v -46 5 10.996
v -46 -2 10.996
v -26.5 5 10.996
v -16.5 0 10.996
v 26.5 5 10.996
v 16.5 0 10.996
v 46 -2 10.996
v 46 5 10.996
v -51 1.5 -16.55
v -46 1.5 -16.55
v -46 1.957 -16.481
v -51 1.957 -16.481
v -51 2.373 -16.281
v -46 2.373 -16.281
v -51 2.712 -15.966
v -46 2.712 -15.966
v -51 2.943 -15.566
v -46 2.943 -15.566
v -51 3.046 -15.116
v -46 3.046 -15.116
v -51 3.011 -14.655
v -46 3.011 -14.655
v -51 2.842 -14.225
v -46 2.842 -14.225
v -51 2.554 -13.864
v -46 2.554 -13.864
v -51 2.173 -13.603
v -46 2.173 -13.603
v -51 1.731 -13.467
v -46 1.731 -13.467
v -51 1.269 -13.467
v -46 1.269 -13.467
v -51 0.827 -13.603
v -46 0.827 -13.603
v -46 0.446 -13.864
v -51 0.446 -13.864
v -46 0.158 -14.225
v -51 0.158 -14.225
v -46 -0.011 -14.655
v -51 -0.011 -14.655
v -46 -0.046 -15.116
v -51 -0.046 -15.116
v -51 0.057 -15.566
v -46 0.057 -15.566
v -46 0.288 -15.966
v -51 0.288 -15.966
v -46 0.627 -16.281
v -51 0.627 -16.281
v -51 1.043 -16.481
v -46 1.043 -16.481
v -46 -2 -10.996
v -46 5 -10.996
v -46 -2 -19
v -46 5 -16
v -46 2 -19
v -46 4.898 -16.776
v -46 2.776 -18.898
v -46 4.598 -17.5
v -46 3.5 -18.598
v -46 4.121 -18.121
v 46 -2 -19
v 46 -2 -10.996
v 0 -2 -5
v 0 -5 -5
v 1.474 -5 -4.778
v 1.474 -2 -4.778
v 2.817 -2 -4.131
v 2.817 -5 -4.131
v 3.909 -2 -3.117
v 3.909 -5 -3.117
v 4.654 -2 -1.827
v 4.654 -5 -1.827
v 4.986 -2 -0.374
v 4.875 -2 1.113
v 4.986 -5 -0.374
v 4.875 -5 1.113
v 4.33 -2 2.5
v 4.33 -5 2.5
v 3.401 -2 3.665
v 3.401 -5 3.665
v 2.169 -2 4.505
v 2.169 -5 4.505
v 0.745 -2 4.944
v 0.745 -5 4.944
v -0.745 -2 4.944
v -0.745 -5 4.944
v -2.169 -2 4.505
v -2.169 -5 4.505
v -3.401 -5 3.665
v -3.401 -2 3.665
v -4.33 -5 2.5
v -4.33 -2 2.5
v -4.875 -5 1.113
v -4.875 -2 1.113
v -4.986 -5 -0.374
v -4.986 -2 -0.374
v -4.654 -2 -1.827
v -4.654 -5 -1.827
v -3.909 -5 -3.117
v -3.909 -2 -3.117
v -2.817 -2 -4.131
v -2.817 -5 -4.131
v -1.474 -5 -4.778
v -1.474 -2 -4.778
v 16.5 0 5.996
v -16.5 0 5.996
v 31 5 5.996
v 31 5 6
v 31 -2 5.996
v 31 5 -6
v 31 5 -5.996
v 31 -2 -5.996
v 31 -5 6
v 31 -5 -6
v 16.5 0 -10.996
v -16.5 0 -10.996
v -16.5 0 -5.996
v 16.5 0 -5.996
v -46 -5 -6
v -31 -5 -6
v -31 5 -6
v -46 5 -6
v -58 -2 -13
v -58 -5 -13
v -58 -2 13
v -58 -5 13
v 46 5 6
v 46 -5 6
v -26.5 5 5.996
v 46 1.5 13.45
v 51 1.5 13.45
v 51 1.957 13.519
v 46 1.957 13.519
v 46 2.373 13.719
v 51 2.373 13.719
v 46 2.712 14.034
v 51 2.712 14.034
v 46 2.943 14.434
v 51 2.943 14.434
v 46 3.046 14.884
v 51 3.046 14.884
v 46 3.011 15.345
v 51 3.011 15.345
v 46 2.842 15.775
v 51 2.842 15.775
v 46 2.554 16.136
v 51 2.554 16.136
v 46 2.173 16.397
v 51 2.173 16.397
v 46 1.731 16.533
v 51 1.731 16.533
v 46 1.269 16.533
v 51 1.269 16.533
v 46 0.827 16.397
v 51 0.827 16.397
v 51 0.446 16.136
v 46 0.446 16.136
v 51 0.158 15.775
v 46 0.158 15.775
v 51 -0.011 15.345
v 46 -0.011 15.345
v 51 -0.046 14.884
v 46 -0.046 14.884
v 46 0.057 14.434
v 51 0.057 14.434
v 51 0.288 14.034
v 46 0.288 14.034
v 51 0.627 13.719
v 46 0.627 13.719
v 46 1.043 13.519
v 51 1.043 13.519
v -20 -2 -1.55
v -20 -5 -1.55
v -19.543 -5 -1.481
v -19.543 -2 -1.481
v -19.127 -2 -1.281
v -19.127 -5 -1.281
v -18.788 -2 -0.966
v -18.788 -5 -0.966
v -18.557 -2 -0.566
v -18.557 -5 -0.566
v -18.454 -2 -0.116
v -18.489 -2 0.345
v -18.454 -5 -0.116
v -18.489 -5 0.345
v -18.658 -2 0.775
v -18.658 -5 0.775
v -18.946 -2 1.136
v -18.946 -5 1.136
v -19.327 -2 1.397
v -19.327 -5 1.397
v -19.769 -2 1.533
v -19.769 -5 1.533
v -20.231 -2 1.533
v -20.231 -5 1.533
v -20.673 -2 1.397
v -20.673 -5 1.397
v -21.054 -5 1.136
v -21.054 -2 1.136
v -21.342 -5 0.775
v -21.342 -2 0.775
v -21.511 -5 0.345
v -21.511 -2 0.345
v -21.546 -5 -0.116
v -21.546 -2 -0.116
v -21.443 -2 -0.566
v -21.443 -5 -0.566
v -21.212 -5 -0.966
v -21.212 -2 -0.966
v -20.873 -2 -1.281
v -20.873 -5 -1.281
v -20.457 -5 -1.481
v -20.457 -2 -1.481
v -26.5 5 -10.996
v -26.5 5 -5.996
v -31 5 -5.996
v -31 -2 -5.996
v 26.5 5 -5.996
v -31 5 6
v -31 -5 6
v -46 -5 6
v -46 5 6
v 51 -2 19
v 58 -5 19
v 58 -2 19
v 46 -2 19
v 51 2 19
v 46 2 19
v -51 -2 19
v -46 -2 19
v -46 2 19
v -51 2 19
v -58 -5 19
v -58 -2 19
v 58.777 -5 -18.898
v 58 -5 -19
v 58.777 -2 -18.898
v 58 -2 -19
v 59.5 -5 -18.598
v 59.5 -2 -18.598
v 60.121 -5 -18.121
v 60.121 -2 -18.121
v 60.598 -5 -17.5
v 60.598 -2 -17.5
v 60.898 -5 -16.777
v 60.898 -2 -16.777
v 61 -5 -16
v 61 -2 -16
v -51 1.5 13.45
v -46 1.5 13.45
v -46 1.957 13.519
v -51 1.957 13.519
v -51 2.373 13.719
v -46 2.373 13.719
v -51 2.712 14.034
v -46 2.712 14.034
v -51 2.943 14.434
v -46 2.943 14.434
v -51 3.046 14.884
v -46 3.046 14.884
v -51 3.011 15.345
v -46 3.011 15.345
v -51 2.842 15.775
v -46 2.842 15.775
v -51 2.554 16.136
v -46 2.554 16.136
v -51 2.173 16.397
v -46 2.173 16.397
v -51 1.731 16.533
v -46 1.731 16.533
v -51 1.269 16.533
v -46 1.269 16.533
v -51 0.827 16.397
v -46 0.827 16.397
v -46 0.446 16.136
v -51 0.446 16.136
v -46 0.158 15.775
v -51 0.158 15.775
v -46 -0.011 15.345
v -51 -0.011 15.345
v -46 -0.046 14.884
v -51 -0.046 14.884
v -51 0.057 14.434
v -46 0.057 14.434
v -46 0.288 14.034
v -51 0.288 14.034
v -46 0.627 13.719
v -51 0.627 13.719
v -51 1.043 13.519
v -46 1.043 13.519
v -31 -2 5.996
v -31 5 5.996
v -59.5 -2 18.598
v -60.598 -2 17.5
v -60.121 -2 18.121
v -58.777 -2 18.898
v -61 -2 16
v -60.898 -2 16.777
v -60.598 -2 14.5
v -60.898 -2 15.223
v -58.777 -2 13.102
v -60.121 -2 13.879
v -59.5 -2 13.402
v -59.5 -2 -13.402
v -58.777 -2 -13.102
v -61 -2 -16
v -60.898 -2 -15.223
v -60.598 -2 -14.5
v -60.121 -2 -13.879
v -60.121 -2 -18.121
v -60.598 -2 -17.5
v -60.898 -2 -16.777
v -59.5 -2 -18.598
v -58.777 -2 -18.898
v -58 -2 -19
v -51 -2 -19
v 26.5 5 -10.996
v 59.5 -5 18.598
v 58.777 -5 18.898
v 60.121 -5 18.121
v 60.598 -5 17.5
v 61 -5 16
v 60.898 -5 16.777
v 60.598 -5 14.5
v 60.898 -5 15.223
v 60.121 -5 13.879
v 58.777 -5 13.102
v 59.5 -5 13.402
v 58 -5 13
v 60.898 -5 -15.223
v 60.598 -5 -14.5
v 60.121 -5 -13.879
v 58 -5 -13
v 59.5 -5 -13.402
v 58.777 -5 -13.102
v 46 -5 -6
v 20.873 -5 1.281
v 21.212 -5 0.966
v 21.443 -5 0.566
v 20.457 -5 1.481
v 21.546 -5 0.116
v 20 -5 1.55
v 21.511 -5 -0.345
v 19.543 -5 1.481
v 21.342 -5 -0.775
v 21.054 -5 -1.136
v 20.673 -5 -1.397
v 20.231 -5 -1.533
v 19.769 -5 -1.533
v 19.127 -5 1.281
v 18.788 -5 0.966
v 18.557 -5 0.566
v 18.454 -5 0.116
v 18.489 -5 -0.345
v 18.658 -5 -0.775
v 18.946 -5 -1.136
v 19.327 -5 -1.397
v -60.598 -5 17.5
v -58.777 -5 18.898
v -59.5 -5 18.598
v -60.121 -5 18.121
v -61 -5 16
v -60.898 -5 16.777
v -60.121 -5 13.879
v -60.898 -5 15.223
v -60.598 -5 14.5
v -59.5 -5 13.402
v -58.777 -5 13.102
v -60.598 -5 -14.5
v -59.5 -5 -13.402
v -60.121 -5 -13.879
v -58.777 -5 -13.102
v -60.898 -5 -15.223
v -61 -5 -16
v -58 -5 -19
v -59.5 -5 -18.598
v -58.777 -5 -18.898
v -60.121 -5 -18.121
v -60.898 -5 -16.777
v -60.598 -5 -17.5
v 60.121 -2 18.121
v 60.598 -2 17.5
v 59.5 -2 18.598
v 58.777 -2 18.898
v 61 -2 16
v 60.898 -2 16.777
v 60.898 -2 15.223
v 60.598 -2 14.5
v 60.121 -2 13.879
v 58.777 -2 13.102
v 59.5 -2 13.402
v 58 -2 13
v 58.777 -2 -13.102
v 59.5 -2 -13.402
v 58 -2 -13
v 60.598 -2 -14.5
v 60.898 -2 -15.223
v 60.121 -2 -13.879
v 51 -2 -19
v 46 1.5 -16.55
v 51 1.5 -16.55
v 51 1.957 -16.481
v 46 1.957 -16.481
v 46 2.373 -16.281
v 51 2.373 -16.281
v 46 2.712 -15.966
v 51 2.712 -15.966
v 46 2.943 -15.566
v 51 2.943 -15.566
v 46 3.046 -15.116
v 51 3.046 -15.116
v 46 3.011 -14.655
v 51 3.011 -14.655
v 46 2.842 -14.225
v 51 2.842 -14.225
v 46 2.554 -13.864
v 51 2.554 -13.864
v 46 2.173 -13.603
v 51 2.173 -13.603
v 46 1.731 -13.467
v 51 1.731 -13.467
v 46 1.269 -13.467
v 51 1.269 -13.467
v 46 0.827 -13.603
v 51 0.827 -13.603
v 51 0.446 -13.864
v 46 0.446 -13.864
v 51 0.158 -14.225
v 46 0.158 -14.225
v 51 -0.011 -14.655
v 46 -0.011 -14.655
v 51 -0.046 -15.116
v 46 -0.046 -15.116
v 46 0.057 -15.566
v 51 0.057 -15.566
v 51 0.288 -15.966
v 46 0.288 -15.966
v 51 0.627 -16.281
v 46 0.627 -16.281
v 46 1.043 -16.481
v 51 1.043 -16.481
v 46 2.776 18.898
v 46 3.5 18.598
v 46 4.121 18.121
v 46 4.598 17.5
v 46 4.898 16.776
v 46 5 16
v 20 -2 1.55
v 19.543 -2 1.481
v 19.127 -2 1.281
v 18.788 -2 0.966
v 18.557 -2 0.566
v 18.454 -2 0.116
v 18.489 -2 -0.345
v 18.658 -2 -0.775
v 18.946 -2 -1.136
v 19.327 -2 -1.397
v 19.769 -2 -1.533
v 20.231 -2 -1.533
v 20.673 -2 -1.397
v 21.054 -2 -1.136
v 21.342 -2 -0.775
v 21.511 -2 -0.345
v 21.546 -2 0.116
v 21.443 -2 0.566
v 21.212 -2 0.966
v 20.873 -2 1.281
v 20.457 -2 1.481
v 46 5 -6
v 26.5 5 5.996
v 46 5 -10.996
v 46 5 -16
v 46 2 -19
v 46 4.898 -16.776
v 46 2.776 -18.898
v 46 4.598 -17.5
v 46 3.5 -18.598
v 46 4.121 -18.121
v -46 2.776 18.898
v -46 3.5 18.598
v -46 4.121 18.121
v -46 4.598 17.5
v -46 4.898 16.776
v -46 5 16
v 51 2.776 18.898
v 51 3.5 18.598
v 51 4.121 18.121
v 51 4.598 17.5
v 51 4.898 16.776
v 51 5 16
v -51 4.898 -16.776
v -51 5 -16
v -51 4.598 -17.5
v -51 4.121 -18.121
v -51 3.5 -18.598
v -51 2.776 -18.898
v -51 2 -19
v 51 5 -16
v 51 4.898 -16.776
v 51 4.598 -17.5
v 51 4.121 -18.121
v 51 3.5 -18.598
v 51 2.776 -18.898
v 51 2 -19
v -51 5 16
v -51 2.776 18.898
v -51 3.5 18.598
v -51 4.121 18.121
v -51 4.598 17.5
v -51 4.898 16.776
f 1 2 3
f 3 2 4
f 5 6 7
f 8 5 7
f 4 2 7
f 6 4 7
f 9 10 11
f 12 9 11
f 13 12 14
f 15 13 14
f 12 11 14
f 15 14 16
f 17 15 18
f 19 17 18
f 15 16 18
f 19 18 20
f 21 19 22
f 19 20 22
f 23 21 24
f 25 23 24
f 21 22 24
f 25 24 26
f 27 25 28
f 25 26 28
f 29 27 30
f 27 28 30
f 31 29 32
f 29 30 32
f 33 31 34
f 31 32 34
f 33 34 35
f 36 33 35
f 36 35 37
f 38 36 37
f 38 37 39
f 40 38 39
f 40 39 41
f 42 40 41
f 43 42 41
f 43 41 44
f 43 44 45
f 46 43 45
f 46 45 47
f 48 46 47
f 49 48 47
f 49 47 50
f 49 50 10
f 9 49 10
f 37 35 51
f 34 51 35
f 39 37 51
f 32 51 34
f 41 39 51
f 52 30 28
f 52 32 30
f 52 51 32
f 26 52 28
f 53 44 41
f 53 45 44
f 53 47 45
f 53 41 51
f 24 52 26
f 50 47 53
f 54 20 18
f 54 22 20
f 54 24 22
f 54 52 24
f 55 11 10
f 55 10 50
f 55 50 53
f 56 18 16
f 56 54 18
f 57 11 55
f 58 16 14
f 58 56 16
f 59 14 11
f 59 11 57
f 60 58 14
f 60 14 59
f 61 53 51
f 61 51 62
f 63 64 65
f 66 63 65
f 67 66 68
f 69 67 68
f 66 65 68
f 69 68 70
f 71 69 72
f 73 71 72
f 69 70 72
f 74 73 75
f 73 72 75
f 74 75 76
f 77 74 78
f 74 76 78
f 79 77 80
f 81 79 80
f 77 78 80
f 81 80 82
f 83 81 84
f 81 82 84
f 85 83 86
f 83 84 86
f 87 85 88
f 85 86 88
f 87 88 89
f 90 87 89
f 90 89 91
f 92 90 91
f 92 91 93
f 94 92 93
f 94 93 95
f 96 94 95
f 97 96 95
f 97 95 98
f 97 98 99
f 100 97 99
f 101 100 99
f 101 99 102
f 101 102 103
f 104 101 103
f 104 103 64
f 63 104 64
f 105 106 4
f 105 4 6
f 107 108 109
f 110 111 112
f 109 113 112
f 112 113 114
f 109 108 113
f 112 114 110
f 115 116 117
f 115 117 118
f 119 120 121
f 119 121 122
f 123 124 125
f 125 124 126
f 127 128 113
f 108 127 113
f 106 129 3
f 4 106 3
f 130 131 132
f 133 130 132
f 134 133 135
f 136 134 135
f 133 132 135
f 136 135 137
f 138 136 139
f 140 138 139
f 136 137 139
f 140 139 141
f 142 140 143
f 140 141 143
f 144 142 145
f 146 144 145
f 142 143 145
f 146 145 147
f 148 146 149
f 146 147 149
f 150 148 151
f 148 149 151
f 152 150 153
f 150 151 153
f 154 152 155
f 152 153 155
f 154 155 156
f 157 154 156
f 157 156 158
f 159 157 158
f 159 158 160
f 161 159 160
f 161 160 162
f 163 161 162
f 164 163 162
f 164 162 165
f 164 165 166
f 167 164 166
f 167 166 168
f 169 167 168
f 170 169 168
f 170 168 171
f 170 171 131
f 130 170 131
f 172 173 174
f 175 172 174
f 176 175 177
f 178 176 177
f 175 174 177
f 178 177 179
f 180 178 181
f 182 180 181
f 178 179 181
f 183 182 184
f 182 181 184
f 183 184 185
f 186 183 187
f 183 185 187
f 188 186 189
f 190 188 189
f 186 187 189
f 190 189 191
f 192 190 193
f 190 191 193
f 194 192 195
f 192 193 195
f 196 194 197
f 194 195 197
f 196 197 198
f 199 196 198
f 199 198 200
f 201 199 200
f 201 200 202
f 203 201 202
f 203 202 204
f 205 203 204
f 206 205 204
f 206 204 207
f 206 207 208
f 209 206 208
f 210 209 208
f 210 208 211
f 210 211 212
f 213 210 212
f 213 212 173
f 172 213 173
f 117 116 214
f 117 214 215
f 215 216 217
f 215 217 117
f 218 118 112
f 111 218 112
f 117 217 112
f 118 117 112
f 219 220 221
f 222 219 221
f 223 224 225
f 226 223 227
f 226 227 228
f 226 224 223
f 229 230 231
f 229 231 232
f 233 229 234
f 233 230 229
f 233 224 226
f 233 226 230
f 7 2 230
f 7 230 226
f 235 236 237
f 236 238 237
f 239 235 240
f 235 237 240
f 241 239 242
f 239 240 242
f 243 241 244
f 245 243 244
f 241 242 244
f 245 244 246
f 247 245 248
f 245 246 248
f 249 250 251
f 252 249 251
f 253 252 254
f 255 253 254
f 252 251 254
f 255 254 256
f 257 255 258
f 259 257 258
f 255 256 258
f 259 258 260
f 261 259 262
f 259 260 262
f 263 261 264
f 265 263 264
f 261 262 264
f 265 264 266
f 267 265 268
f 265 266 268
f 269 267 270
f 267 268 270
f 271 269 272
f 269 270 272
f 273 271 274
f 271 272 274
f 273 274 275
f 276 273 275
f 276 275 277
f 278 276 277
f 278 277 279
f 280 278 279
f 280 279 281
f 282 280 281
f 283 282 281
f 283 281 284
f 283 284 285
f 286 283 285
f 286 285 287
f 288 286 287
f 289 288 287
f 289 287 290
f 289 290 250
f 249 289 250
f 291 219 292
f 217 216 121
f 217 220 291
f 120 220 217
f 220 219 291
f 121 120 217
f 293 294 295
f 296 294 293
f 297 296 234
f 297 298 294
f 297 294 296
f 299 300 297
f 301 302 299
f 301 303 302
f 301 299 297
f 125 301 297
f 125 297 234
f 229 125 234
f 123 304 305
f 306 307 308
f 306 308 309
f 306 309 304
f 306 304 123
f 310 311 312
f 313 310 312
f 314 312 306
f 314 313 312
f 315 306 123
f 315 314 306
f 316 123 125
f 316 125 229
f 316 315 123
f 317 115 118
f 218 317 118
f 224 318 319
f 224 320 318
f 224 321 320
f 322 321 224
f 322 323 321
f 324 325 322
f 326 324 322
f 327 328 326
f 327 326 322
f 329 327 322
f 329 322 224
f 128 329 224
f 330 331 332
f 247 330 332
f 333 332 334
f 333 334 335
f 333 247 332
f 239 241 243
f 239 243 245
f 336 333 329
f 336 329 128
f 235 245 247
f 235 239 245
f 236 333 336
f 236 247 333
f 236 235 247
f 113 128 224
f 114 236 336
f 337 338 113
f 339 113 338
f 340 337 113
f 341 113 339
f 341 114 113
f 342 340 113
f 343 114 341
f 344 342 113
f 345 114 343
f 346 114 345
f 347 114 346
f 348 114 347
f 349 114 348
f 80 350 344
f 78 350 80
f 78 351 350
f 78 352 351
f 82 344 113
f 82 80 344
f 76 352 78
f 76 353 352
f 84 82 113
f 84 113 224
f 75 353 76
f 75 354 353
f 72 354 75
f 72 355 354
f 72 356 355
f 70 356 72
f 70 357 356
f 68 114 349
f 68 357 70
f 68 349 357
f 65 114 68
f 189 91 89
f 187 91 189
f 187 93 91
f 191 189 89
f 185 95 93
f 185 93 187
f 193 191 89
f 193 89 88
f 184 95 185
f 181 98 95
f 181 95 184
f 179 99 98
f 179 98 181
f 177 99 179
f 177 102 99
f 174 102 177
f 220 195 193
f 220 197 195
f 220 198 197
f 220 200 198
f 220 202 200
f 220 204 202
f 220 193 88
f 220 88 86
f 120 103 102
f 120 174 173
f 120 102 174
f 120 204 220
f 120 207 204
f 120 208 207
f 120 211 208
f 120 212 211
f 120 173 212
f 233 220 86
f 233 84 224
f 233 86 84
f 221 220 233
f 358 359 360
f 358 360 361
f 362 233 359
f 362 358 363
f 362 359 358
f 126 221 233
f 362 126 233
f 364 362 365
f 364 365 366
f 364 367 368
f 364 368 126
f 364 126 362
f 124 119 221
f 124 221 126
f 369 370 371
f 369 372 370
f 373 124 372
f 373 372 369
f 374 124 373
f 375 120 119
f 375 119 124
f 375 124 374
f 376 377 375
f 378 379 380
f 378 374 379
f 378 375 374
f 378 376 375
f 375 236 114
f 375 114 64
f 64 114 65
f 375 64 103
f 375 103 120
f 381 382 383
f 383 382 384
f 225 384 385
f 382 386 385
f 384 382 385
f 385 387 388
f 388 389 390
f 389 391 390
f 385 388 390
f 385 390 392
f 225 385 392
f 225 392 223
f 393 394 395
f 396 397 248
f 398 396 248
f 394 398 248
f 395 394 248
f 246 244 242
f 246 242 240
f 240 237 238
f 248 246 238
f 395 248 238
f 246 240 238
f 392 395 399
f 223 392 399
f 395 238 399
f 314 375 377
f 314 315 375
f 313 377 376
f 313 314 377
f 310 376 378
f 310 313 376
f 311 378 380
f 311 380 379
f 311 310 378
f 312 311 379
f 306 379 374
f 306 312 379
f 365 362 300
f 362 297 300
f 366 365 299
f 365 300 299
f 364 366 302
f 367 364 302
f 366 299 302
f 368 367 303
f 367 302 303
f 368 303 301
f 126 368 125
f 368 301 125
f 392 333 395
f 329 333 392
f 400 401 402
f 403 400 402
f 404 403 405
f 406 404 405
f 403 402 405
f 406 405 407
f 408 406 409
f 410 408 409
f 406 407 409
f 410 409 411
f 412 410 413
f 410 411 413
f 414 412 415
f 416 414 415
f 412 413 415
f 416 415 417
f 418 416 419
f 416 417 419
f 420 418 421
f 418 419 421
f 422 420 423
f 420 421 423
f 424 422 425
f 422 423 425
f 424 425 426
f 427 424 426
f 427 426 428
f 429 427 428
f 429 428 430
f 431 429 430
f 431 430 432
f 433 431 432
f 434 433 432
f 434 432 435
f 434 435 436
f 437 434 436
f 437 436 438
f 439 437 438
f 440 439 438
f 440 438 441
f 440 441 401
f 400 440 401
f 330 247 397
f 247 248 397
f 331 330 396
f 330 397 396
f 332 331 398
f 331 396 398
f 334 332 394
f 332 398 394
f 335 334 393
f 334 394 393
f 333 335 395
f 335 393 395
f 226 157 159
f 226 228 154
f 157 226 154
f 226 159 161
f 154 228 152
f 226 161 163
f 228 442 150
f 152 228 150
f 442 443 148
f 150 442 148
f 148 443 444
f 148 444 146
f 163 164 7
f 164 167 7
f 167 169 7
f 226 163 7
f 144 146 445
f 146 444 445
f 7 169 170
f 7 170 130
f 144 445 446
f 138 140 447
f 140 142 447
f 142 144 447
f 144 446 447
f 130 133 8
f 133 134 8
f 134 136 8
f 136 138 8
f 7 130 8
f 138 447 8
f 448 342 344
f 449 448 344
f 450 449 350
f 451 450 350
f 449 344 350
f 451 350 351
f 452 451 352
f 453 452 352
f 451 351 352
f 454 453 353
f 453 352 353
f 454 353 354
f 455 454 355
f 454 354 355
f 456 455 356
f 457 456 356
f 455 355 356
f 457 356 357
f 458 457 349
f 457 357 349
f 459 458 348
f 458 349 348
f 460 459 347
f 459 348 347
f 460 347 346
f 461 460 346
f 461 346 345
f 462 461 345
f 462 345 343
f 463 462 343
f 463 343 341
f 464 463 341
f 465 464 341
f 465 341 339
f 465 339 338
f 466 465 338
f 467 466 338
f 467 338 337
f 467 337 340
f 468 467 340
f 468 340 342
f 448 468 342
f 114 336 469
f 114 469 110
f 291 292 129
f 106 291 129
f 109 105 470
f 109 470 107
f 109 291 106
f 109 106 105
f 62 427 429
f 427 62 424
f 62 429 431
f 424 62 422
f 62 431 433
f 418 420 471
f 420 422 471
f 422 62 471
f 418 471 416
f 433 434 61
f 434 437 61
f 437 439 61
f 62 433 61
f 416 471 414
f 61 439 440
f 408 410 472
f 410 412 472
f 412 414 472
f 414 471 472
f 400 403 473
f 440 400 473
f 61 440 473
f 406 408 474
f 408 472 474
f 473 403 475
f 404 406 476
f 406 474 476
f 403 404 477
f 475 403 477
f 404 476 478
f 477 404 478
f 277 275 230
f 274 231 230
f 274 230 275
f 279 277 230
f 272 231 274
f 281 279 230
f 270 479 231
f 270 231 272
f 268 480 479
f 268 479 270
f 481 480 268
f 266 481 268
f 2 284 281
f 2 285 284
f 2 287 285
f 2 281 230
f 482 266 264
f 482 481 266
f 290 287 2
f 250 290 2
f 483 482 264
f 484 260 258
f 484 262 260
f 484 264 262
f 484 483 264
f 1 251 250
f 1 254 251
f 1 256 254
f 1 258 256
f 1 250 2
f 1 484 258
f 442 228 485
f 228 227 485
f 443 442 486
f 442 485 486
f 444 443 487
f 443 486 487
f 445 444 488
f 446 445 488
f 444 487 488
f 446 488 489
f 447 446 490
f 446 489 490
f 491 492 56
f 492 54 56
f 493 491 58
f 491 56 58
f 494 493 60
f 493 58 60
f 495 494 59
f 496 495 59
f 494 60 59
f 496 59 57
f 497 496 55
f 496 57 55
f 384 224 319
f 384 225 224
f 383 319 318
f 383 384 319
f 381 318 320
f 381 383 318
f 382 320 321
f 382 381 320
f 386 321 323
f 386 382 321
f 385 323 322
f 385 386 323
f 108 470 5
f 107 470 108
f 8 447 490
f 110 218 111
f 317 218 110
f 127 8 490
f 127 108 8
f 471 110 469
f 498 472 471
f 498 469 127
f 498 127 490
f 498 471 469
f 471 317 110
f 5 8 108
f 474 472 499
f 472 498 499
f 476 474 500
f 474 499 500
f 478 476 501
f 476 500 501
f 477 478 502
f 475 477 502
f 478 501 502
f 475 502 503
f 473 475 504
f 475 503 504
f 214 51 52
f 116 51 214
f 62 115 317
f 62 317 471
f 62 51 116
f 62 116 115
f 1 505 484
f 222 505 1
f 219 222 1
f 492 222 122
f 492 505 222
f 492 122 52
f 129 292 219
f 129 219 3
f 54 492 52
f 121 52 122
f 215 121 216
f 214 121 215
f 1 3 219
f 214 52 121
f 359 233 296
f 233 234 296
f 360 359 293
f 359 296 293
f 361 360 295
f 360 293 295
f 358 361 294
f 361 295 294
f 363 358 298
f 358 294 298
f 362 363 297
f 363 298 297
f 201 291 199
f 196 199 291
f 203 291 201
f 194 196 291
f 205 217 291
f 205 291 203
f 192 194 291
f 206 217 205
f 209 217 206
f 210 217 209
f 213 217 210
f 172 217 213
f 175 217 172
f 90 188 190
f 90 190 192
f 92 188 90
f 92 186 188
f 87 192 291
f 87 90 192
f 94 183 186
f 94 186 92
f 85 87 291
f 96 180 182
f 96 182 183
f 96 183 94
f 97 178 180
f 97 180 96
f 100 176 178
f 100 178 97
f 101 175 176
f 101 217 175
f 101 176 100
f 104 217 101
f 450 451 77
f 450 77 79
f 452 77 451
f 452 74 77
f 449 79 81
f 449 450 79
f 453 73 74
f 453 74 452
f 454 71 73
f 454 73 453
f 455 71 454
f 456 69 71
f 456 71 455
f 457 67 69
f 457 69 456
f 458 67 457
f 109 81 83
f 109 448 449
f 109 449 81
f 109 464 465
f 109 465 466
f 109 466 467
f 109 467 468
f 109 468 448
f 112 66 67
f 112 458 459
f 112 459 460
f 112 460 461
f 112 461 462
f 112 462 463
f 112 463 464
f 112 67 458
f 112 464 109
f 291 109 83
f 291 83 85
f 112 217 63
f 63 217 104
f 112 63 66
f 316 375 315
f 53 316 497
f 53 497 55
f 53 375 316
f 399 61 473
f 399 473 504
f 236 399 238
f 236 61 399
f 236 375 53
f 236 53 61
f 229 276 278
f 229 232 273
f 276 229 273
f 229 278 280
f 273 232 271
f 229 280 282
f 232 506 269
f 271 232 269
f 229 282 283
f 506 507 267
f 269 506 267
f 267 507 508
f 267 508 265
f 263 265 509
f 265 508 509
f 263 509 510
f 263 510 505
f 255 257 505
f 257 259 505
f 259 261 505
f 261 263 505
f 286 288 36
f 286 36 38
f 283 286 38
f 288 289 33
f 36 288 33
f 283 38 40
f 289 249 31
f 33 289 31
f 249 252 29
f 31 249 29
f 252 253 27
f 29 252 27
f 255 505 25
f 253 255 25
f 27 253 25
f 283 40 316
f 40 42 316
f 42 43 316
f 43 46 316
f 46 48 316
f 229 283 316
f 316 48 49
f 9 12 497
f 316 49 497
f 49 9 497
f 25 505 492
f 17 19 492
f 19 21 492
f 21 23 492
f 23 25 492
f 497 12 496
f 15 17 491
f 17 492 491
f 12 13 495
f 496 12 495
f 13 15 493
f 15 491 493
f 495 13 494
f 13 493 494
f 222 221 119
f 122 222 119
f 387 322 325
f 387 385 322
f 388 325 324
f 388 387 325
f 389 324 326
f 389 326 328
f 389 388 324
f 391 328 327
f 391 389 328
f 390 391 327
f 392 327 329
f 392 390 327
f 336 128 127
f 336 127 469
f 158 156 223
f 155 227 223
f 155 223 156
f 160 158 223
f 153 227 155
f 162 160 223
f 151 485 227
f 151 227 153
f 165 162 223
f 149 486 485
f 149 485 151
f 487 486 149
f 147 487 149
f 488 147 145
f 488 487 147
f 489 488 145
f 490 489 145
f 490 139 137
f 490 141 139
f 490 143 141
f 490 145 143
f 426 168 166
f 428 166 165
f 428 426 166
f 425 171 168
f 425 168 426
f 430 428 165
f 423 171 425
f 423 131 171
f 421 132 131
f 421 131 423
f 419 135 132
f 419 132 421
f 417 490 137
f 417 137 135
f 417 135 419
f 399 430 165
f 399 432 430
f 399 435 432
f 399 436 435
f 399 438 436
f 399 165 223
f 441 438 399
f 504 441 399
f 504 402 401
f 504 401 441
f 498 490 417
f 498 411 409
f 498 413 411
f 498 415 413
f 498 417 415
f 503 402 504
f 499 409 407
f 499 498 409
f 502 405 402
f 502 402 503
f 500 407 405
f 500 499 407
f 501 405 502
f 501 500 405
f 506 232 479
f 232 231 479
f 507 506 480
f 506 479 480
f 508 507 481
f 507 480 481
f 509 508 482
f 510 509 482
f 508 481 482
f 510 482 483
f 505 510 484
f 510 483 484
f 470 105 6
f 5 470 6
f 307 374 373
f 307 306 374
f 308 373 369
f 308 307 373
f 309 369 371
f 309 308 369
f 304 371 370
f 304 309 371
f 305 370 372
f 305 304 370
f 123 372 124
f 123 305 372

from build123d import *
from OCP.BRepFilletAPI import BRepFilletAPI_MakeChamfer

# Parameters (mm, degrees)
SKETCH_1_W               = 102
SKETCH_1_H               = 38
EXTRUDE_1_DEPTH          = 5
EXTRUDE_START            = -10
EXTRUDE_2_DEPTH          = 3
SKETCH_23_W              = 92
SKETCH_23_H              = 38
CUT_EXTRUDE_4_DEPTH      = 7
SKETCH_25_W              = 92.5
SKETCH_25_H              = 5
EXTRUDE_3_DEPTH          = 7
SKETCH_21_R              = 1.55
SKETCH_21_R_2            = 5
SKETCH_21_W              = 15
SKETCH_21_H              = 12
CUT_EXTRUDE_1_DEPTH      = 10
CUT_EXTRUDE_7_DEPTH      = 65.08587988
CUT_EXTRUDE_7_DEPTH_BACK = 65.08587988
SKETCH_27_W              = 53
SKETCH_27_H              = 12
CHAMFER_1_SIZE           = 5
CHAMFER_1_SIZE_2         = 10
CHAMFER_2_SIZE           = 5
CHAMFER_2_SIZE_2         = 10
SKETCH2_R                = 1.55
CUT_EXTRUDE1_DEPTH       = 114.710157858
FILLET1_R                = 3
FILLET2_R                = 3


with BuildPart() as part:
    # 草图1 → 凸台-拉伸1 (new, symmetric)
    with BuildSketch(Plane(origin=(0, 0, 0), x_dir=(1, 0, 0), z_dir=(0, 1, 0))):
        Rectangle(SKETCH_1_W, SKETCH_1_H)
    extrude(amount=EXTRUDE_1_DEPTH, both=True)

    # 草图4 → 凸台-拉伸2 (add)
    with BuildSketch(Plane(origin=(0, 5, 0), x_dir=(1, 0, 0), z_dir=(0, 1, 0)).offset(EXTRUDE_START)):
        Polygon((61, -19), (51, -19), (51, 19), (61, 19), (61, 13), (58, 13), (58, -13), (61, -13), align=None)
        Polygon((-61, 19), (-61, 13), (-58, 13), (-58, -13), (-61, -13), (-61, -19), (-51, -19), (-51, 19), align=None)
    extrude(amount=EXTRUDE_2_DEPTH)

    # 草图23 → 切除-拉伸4 (cut)
    with BuildSketch(Plane(origin=(0, 5, 0), x_dir=(1, 0, 0), z_dir=(0, 1, 0))):
        Rectangle(SKETCH_23_W, SKETCH_23_H)
    extrude(amount=-CUT_EXTRUDE_4_DEPTH, mode=Mode.SUBTRACT)

    # 草图25 → 凸台-拉伸3 (add)
    with BuildSketch(Plane(origin=(0, -2, 0), x_dir=(1, 0, 0), z_dir=(0, 1, 0))):
        with Locations((0.25, -8.496322734)):
            Rectangle(SKETCH_25_W, SKETCH_25_H)
        with Locations((0.25, 8.496322734)):
            Rectangle(SKETCH_25_W, SKETCH_25_H)
    extrude(amount=EXTRUDE_3_DEPTH)

    # 草图21 → 切除-拉伸1 (cut)
    with BuildSketch(Plane(origin=(0, -5, 0), x_dir=(-1, 0, 0), z_dir=(0, -1, 0))):
        with Locations(Location((-20, 0, 0), (0, 0, 270))):
            Circle(SKETCH_21_R)
        with Locations(Location((20, 0, 0), (0, 0, 90))):
            Circle(SKETCH_21_R)
        with Locations(Location((0, 0, 0), (0, 0, 90))):
            Circle(SKETCH_21_R_2)
        with Locations((-38.5, 0)):
            Rectangle(SKETCH_21_W, SKETCH_21_H)
        with Locations((38.5, 0)):
            Rectangle(SKETCH_21_W, SKETCH_21_H)
    extrude(amount=-CUT_EXTRUDE_1_DEPTH, mode=Mode.SUBTRACT)

    # 草图27 → 切除-拉伸7 (cut, two sides: drawn at the far end of the back side and taken through both)
    with BuildSketch(Plane.XY.offset(-CUT_EXTRUDE_7_DEPTH_BACK)):
        with Locations((0, 6)):
            Rectangle(SKETCH_27_W, SKETCH_27_H)
    extrude(amount=CUT_EXTRUDE_7_DEPTH + CUT_EXTRUDE_7_DEPTH_BACK, mode=Mode.SUBTRACT)

    # 倒角1
    chamfer_1_edges_1 = [part.edges().sort_by_distance(p)[0] for p in [
        (26.5, 0, -8.496322734),
    ]]
    chamfer_1_side_1 = [part.faces().sort_by_distance(p)[0] for p in [
        (26.5, 0.1, -8.496322734),
    ]]
    chamfer_1_edges_2 = [part.edges().sort_by_distance(p)[0] for p in [
        (26.5, 0, 8.496322734),
    ]]
    chamfer_1_side_2 = [part.faces().sort_by_distance(p)[0] for p in [
        (26.5, 0.1, 8.496322734),
    ]]
    chamfer_1 = BRepFilletAPI_MakeChamfer(part.part.solid().wrapped)
    for e in chamfer_1_edges_1:
        chamfer_1.Add(CHAMFER_1_SIZE - 0.0001, CHAMFER_1_SIZE_2 - 0.0001, e.wrapped, chamfer_1_side_1[0].wrapped)
    for e in chamfer_1_edges_2:
        chamfer_1.Add(CHAMFER_1_SIZE - 0.0001, CHAMFER_1_SIZE_2 - 0.0001, e.wrapped, chamfer_1_side_2[0].wrapped)
    add(Compound.cast(chamfer_1.Shape()), mode=Mode.REPLACE)  # a hair under: the kernel refuses the full size

    # 倒角2
    chamfer_2_edges_1 = [part.edges().sort_by_distance(p)[0] for p in [
        (-26.5, 0, -8.496322734),
    ]]
    chamfer_2_side_1 = [part.faces().sort_by_distance(p)[0] for p in [
        (-26.5, 0.1, -8.496322734),
    ]]
    chamfer_2_edges_2 = [part.edges().sort_by_distance(p)[0] for p in [
        (-26.5, 0, 8.496322734),
    ]]
    chamfer_2_side_2 = [part.faces().sort_by_distance(p)[0] for p in [
        (-26.4, 0, 8.496322734),
    ]]
    chamfer_2 = BRepFilletAPI_MakeChamfer(part.part.solid().wrapped)
    for e in chamfer_2_edges_1:
        chamfer_2.Add(CHAMFER_2_SIZE - 0.0001, CHAMFER_2_SIZE_2 - 0.0001, e.wrapped, chamfer_2_side_1[0].wrapped)
    for e in chamfer_2_edges_2:
        chamfer_2.Add(CHAMFER_2_SIZE_2 - 0.0001, CHAMFER_2_SIZE - 0.0001, e.wrapped, chamfer_2_side_2[0].wrapped)
    add(Compound.cast(chamfer_2.Shape()), mode=Mode.REPLACE)  # a hair under: the kernel refuses the full size

    # Sketch2 → Cut-Extrude1 (cut, through all)
    with BuildSketch(Plane(origin=(51, 0, 0), x_dir=(0, 0, -1), z_dir=(1, 0, 0))):
        with Locations((15, 1.5)):
            Circle(SKETCH2_R)
        with Locations((-15, 1.5)):
            Circle(SKETCH2_R)
    extrude(amount=-CUT_EXTRUDE1_DEPTH, mode=Mode.SUBTRACT)

    # Fillet1
    fillet1_edges = [part.edges().sort_by_distance(p)[0] for p in [
        (-61, -3.5, 19),
        (-61, -3.5, 13),
        (-61, -3.5, -13),
        (-61, -3.5, -19),
        (61, -3.5, -13),
        (61, -3.5, -19),
        (61, -3.5, 19),
        (61, -3.5, 13),
    ]]
    fillet(fillet1_edges, radius=FILLET1_R - 0.0001)  # a hair under: the kernel refuses the full size

    # Fillet2
    fillet2_edges = [part.edges().sort_by_distance(p)[0] for p in [
        (-48.5, 5, -19),
        (-48.5, 5, 19),
        (48.5, 5, 19),
        (48.5, 5, -19),
    ]]
    fillet(fillet2_edges, radius=FILLET2_R)


solid = part.part
